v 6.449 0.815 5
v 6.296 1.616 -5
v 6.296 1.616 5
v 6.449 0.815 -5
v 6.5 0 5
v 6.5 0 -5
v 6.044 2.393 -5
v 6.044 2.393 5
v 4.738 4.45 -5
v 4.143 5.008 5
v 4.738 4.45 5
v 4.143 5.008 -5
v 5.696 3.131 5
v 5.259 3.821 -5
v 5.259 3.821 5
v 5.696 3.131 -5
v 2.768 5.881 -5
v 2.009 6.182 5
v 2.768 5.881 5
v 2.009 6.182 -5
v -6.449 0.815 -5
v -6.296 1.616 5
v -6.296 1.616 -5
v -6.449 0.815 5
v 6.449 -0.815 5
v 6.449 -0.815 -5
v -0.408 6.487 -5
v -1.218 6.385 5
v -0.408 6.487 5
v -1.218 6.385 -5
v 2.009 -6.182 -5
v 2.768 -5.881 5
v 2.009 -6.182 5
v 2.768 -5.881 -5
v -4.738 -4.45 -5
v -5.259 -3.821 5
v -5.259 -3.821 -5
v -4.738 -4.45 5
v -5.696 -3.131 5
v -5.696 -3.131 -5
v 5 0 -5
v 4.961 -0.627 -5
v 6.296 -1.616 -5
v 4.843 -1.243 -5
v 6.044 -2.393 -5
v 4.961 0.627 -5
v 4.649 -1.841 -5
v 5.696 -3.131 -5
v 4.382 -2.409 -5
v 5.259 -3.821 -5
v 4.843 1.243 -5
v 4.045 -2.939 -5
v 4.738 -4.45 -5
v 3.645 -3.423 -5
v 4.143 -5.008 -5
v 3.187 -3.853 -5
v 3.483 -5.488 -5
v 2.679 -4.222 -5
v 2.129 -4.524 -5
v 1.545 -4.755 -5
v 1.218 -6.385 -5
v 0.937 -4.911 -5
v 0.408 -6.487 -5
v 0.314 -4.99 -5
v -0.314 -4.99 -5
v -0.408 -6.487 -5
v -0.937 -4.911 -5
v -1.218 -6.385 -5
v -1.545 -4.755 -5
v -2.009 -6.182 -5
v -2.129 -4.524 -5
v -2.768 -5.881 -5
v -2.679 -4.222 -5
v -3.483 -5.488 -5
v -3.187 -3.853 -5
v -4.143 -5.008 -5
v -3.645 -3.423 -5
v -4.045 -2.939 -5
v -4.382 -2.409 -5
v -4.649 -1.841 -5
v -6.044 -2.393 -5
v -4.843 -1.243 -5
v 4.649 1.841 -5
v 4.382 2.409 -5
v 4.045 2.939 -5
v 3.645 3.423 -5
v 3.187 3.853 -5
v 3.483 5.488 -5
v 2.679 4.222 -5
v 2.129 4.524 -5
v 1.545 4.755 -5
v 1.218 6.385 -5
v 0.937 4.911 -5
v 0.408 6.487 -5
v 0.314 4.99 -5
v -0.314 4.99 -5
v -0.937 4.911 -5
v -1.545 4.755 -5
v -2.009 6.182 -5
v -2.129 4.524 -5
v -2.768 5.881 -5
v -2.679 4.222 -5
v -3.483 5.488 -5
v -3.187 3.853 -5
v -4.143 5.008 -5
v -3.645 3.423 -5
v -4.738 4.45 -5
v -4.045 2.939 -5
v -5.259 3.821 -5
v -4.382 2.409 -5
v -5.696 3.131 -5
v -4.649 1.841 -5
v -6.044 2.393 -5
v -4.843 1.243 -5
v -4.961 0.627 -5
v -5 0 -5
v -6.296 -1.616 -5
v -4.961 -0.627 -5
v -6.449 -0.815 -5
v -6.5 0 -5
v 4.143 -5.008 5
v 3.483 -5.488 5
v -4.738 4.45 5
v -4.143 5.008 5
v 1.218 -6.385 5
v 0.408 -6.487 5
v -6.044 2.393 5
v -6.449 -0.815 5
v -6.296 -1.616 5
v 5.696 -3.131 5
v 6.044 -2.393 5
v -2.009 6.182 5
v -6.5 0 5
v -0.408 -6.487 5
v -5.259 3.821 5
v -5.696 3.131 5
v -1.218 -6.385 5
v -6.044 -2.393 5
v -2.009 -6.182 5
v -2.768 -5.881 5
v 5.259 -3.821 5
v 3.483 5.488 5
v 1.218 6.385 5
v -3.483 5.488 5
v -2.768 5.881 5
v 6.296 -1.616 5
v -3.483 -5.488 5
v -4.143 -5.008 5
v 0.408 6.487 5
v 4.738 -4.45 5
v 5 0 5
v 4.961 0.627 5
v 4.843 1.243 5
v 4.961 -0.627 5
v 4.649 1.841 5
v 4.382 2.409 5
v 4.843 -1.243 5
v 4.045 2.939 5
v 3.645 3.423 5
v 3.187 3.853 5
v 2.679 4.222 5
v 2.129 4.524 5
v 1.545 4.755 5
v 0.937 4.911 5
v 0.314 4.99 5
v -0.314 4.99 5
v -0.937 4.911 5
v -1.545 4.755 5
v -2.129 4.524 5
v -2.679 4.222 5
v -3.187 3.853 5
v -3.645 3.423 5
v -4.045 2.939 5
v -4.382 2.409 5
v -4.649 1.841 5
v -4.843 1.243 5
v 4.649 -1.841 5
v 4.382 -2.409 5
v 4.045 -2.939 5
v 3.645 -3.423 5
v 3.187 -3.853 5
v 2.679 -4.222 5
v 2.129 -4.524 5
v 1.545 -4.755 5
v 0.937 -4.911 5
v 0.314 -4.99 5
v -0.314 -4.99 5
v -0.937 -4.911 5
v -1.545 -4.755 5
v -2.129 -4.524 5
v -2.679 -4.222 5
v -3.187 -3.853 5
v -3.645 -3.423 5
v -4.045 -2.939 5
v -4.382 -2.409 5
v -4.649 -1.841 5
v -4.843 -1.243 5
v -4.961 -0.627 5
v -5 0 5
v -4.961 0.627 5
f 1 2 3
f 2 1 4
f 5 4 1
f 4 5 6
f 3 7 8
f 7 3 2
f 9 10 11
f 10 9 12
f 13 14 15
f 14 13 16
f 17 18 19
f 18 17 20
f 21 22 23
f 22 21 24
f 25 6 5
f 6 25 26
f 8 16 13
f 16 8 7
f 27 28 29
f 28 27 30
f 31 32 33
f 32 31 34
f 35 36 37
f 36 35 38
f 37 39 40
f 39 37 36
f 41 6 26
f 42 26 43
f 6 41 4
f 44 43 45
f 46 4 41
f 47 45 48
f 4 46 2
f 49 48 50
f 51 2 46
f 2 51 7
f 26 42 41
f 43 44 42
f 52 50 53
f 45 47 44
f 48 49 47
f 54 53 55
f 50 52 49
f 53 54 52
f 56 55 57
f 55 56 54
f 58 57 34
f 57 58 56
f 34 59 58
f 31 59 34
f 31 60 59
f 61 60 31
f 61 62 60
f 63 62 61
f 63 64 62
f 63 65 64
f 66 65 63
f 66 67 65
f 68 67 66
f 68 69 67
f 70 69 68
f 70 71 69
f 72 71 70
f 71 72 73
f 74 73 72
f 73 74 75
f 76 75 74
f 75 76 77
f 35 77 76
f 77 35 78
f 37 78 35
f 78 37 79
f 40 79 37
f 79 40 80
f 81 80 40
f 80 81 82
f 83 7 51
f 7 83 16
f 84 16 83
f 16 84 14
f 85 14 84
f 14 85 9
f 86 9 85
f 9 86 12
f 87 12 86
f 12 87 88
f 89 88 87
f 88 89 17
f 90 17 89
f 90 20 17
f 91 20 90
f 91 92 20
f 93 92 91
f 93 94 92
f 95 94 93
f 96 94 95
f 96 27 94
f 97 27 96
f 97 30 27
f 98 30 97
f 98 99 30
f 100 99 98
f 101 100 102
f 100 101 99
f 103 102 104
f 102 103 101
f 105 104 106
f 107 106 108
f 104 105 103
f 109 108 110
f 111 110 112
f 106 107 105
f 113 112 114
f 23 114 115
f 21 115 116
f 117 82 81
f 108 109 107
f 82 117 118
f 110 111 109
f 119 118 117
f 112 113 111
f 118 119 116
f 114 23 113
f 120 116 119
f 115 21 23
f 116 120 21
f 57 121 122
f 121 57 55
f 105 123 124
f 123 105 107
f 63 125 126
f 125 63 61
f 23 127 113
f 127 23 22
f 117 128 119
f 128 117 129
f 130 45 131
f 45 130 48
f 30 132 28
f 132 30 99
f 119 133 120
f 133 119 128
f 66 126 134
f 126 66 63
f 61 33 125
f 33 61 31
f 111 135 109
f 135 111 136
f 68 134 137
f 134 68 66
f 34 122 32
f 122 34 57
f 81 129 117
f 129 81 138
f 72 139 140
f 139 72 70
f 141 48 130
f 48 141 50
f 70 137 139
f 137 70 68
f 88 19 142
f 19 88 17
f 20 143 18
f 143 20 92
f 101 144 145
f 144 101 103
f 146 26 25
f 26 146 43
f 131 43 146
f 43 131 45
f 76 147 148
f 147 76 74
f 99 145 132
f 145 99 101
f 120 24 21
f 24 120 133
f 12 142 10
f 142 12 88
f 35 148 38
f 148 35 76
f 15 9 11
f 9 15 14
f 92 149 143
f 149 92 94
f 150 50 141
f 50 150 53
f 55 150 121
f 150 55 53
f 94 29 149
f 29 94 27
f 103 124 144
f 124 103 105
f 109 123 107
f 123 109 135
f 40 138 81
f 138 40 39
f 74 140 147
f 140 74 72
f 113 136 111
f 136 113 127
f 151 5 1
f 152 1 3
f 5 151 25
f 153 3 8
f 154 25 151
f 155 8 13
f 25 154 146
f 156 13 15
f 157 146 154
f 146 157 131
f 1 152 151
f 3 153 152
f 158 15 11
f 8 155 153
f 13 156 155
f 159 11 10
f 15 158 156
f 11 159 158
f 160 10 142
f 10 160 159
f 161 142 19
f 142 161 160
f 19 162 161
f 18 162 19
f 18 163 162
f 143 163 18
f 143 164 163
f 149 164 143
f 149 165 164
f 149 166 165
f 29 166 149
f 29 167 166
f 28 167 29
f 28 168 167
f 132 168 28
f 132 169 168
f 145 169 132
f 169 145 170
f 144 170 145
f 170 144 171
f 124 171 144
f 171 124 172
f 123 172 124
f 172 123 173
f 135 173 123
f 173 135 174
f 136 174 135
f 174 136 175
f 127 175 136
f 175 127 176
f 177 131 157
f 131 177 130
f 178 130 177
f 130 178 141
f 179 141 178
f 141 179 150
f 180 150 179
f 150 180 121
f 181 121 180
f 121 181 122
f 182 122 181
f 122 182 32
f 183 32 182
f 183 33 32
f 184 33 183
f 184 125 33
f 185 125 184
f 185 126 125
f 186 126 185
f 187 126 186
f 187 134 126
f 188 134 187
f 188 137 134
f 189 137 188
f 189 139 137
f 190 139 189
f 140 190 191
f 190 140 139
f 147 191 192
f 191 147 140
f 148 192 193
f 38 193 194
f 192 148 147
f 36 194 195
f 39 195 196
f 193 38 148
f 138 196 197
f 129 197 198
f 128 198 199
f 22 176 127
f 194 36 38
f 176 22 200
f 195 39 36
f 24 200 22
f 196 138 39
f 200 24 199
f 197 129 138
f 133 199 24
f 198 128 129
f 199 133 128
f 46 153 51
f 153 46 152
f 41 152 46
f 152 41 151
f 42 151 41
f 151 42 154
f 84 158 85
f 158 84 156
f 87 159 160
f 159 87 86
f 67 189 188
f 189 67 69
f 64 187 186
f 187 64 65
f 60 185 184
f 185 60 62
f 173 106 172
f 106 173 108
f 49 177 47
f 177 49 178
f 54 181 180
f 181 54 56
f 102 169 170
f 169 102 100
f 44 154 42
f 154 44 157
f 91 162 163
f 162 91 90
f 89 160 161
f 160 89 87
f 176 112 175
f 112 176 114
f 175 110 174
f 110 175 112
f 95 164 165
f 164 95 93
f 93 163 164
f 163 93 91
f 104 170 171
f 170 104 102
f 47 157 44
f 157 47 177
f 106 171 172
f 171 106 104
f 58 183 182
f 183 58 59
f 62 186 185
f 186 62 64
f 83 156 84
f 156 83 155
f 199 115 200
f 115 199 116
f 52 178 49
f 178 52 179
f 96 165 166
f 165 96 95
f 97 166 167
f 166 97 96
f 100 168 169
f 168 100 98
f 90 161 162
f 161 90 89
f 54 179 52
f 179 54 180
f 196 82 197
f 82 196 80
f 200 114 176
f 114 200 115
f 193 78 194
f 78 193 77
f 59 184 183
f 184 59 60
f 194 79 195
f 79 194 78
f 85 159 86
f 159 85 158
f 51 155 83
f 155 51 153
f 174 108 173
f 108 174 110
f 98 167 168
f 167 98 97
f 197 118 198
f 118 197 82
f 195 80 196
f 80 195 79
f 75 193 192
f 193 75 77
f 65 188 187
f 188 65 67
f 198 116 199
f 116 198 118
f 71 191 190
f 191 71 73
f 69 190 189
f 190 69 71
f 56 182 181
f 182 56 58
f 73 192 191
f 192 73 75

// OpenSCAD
$fn = 50;


difference() {
	union() {
		translate(v = [0, 0, -5.0000000000]) {
			cylinder(h = 10, r = 6.5000000000);
		}
	}
	union() {
		translate(v = [0, 0, -100.0000000000]) {
			cylinder(h = 200, r = 5.0000000000);
		}
	}
}
